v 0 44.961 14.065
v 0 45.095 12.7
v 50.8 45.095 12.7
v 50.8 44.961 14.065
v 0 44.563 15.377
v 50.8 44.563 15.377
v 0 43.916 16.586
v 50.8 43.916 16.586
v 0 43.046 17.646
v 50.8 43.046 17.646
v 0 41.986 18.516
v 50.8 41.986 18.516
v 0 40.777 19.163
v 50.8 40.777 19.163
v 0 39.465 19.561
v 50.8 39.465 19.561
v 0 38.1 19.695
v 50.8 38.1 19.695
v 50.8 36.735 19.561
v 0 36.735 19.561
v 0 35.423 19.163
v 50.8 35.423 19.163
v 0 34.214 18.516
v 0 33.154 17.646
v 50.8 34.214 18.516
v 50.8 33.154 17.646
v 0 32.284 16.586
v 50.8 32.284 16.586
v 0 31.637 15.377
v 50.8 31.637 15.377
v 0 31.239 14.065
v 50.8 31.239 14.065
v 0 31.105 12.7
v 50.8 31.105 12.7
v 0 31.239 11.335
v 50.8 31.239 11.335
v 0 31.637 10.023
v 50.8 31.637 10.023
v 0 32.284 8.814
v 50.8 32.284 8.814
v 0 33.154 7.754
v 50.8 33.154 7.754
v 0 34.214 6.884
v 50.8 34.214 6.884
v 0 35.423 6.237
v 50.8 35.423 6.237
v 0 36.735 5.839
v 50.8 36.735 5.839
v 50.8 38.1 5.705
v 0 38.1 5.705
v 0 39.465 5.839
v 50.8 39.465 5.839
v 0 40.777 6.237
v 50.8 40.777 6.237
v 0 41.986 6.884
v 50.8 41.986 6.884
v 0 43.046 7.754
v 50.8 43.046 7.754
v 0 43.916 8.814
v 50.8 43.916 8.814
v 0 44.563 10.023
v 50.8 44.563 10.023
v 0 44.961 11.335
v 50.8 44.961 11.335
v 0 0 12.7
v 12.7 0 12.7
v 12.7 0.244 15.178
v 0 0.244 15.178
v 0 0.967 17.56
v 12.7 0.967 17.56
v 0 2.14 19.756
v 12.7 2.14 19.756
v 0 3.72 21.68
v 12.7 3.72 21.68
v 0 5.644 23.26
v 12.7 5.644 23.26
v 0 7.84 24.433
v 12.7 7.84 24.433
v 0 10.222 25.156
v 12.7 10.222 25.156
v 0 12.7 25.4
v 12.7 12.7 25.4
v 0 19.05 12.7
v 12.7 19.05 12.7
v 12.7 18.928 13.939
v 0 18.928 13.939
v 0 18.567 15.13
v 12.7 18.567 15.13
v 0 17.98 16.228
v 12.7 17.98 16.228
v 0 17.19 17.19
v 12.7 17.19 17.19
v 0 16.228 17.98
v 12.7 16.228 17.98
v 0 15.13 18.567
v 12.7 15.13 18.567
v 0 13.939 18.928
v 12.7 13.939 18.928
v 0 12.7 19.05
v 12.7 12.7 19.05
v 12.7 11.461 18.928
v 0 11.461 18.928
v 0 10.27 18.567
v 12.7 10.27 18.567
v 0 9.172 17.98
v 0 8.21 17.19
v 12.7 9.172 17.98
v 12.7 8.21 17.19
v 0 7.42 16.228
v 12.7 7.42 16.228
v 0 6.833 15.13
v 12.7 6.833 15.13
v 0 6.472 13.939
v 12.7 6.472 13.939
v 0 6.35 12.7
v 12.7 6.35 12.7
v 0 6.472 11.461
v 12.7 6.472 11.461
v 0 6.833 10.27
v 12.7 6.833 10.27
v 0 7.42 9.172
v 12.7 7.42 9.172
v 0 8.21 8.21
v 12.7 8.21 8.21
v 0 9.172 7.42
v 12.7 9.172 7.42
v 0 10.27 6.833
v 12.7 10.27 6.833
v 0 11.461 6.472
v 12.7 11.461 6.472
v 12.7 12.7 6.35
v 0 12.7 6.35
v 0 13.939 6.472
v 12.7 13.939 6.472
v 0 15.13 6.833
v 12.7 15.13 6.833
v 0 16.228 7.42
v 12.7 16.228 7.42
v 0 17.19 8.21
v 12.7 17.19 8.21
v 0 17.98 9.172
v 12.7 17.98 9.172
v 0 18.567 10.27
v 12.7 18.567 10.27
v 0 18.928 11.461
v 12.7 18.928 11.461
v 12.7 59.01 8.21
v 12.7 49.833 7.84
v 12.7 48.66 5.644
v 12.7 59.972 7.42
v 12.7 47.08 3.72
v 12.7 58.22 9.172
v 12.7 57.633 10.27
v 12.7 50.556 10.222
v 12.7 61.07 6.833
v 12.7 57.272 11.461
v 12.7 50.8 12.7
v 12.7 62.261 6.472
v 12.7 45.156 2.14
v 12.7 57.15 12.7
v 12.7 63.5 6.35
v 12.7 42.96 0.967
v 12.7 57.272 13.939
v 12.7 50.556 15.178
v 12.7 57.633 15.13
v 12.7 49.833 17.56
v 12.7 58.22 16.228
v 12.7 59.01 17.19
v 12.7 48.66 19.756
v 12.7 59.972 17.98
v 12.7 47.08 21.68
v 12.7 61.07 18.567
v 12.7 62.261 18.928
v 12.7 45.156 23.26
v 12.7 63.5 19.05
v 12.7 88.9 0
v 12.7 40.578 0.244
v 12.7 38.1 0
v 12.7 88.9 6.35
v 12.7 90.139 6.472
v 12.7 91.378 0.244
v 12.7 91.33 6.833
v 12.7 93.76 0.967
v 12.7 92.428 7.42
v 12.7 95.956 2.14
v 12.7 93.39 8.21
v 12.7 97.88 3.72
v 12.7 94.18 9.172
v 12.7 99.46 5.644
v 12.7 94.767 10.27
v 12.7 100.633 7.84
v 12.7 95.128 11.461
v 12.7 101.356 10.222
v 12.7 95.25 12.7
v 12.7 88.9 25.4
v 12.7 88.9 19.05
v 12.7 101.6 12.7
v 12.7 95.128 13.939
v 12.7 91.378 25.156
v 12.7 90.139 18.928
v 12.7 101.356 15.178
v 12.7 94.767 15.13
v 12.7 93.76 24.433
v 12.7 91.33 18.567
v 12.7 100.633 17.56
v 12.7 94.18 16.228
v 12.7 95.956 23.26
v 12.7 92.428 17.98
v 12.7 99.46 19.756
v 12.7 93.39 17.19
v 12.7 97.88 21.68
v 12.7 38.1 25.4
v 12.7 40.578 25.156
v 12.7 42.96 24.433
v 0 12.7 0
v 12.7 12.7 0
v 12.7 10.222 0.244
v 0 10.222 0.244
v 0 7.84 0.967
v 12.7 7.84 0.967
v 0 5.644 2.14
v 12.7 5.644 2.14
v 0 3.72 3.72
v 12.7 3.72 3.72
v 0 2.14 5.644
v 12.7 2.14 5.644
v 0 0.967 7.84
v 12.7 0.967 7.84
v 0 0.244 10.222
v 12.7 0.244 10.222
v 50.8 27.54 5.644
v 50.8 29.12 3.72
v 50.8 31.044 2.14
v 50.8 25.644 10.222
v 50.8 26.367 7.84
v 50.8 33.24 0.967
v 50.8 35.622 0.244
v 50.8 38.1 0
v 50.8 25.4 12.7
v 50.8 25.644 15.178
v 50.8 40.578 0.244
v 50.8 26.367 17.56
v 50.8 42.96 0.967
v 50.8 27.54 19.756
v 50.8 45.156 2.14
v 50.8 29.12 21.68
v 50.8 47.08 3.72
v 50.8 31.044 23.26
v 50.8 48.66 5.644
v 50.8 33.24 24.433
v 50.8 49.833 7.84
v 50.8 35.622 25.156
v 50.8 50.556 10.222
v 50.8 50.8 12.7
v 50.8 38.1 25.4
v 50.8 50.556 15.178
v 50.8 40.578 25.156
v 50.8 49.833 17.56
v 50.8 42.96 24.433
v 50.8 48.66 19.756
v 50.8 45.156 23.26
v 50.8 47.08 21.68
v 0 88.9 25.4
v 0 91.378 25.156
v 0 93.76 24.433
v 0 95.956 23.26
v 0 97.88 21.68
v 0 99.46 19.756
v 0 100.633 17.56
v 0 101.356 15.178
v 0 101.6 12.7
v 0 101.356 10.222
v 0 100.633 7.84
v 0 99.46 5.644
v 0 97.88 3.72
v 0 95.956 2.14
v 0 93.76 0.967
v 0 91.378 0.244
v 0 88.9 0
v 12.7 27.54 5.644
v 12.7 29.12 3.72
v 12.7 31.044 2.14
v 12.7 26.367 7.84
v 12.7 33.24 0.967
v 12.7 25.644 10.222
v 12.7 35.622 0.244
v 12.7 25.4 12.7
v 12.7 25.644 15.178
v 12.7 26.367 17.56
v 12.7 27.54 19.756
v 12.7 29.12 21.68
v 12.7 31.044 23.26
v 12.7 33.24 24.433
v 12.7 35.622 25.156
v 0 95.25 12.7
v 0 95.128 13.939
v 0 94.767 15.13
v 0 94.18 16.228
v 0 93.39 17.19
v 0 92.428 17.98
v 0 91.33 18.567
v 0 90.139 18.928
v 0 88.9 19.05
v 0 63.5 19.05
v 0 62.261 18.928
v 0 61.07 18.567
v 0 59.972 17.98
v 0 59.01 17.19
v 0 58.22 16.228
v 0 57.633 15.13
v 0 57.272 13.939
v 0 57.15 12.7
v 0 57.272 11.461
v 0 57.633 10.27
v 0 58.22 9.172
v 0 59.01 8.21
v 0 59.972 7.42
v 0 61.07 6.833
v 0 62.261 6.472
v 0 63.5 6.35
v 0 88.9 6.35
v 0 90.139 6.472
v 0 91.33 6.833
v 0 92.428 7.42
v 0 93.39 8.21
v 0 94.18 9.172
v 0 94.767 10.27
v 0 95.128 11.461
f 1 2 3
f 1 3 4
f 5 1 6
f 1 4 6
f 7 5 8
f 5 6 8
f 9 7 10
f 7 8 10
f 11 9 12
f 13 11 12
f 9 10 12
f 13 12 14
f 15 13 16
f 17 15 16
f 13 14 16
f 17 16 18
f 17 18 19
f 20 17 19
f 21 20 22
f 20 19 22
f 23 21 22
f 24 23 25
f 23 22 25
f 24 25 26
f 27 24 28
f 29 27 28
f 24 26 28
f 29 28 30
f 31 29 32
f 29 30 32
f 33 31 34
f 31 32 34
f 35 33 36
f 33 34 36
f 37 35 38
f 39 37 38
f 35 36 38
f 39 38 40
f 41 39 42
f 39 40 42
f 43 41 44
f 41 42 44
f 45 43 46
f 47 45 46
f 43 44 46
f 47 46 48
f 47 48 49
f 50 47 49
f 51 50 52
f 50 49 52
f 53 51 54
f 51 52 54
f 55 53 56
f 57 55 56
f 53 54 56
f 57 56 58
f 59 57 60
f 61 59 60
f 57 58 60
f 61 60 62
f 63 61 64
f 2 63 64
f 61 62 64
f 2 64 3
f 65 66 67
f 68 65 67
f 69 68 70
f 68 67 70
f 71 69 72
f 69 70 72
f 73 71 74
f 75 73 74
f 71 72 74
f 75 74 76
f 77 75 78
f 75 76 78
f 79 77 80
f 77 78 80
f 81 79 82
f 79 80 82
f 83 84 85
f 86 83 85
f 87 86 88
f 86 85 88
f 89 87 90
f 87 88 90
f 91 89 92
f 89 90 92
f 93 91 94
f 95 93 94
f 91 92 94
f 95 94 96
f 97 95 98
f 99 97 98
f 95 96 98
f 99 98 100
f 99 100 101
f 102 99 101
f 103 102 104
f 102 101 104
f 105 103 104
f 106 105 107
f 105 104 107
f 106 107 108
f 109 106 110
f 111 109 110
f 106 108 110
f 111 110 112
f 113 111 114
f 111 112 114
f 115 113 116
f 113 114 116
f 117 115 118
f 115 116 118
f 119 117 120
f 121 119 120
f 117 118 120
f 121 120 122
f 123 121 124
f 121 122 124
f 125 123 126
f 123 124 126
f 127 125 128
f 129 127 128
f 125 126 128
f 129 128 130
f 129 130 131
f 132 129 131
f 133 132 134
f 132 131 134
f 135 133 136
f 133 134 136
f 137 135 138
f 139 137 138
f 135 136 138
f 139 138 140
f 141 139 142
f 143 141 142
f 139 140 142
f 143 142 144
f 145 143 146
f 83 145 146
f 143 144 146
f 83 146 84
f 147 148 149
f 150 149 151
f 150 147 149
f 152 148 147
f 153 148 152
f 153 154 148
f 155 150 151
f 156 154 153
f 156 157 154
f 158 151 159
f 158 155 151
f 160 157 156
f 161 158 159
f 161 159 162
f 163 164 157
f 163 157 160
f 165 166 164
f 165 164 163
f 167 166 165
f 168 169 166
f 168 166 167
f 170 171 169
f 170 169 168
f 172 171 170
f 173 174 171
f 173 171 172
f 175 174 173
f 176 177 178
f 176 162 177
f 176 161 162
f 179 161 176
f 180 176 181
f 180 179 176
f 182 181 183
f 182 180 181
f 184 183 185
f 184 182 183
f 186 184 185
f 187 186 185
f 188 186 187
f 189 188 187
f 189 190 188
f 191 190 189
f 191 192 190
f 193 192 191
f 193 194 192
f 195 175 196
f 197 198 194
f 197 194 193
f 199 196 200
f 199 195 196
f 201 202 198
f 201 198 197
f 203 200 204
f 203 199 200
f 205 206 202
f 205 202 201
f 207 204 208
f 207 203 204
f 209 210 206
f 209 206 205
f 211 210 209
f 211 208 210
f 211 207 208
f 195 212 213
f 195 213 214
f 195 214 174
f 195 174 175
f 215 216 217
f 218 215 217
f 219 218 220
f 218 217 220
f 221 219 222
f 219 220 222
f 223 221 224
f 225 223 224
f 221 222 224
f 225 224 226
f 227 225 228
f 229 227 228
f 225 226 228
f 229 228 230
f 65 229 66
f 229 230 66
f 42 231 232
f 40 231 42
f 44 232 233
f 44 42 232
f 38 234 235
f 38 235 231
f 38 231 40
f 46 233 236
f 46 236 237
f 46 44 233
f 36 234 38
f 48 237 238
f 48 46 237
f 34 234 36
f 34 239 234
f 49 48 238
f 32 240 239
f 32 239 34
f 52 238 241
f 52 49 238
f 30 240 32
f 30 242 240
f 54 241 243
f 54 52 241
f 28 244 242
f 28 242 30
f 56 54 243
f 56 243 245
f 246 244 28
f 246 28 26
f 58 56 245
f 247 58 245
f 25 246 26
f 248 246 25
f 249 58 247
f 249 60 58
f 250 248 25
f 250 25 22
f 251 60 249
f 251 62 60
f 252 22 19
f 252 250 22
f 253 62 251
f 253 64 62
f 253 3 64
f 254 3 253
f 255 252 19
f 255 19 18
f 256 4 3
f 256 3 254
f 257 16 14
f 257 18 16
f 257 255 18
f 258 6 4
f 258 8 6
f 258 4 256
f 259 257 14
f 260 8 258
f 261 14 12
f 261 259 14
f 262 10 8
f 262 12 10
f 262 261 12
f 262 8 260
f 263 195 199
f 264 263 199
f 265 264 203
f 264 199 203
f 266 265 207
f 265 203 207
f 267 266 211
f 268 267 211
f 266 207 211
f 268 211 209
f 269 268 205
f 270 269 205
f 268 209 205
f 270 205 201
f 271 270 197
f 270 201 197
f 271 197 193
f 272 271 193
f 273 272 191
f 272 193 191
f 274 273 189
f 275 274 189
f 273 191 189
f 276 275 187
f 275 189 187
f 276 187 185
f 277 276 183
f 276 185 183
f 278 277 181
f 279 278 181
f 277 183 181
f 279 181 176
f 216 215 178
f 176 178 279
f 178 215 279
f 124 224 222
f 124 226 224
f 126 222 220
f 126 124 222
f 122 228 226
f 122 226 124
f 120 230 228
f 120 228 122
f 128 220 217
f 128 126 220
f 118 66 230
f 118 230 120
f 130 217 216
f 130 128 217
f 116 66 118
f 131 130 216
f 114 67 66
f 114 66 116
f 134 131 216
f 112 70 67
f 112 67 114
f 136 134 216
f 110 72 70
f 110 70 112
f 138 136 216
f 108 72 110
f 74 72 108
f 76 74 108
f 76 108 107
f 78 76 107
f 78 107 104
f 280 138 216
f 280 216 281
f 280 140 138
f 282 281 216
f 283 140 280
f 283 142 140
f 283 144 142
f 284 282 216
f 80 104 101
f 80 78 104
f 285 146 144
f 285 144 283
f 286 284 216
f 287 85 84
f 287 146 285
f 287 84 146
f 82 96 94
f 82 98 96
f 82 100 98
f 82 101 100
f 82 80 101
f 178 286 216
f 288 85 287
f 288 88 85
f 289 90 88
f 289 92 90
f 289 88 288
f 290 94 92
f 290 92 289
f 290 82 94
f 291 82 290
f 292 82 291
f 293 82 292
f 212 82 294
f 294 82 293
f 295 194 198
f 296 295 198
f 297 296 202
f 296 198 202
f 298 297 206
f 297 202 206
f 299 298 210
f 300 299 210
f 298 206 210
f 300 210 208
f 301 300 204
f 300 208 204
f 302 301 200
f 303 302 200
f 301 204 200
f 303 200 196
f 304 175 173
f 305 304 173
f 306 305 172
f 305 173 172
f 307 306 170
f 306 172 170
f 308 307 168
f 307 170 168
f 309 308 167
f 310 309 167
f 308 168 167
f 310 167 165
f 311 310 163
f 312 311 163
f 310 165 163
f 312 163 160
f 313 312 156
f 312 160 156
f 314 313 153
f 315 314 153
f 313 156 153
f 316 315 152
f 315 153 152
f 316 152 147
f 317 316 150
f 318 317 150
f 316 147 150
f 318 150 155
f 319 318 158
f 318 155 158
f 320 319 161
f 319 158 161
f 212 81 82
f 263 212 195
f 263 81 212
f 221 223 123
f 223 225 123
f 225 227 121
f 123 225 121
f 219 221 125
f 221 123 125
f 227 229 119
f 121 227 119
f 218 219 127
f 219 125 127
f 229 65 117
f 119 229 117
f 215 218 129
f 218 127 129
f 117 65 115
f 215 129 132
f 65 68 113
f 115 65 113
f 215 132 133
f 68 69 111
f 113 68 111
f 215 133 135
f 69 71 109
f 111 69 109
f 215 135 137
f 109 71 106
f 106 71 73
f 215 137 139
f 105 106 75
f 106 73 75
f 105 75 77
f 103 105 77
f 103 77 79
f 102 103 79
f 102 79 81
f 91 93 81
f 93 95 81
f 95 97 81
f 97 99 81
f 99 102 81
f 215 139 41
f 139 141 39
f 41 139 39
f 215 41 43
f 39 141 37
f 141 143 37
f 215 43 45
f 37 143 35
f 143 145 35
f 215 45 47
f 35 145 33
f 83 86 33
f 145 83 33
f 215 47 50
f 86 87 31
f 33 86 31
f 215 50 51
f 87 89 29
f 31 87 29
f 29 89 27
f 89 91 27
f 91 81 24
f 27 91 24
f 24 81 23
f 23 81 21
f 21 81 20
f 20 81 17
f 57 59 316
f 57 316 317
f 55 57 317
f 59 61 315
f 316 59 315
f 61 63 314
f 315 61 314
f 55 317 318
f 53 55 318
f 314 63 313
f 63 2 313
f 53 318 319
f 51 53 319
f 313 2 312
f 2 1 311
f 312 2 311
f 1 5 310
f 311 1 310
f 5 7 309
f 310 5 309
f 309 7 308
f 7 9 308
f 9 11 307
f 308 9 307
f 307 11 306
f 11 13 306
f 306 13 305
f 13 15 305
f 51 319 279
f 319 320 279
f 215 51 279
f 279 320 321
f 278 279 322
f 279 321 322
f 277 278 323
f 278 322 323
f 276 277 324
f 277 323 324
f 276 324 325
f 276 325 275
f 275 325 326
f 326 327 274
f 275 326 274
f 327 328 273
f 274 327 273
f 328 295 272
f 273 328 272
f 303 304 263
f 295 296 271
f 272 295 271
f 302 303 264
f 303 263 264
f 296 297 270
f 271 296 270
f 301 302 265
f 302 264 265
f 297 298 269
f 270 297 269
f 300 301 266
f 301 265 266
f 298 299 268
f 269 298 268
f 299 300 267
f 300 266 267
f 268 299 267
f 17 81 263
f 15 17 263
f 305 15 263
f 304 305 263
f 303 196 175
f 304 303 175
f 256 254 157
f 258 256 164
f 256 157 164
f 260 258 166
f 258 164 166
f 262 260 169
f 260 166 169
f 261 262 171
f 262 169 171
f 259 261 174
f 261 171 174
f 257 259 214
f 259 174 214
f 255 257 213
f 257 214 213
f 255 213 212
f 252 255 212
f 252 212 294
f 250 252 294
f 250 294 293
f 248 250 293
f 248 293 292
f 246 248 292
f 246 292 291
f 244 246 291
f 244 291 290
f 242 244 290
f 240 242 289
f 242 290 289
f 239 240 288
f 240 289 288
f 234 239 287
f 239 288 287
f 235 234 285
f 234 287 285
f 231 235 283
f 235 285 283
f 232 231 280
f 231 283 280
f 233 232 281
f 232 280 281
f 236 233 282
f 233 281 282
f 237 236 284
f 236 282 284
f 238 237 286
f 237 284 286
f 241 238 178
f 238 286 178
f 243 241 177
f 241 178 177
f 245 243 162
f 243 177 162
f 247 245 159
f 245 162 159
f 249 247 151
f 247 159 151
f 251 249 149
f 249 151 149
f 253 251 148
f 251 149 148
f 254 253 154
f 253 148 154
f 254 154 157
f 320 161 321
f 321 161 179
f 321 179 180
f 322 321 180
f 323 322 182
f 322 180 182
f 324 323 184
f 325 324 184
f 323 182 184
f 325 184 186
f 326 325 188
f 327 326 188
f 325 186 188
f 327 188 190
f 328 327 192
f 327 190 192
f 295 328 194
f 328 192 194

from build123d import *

# Parameters (mm, degrees)
F0_W      = 101.6
F0_H      = 25.4
F1_DEPTH  = 12.7
F3_DEPTH  = 12.7
F4_R      = 6.35
F5_DEPTH  = 12.7
F7_R      = 12.7
F8_DEPTH  = 38.1
F9_R      = 6.9951982556
F10_DEPTH = 50.8


# Not quite as in the source:
# - ends of sketch curves that miss each other by under 0.0002 mm in the source are joined


with BuildPart() as f1:
    # F0 (on Right) → F1 (new body)
    with BuildSketch(Plane.YZ):
        with Locations((50.8, 12.7)):
            Rectangle(F0_W, F0_H)
    extrude(amount=F1_DEPTH)

    # F2 (on face) → F3 (cut)
    with BuildSketch(Plane.YZ.offset(12.7)):
        with BuildLine():
            Line((0, 25.4), (0, 12.7))
            ThreePointArc((0, 12.7), (3.7197438789, 21.6802561211), (12.7, 25.4))
            Line((12.7, 25.4), (0, 25.4))
        make_face()
        with BuildLine():
            Line((0, 0), (12.7, 0))
            ThreePointArc((12.7, 0), (3.7197438789, 3.7197438789), (0, 12.7))
            Line((0, 12.7), (0, 0))
        make_face()
        with BuildLine():
            ThreePointArc((88.9, 25.4), (97.8802564546, 21.6802563035), (101.6000005159, 12.7))
            Line((101.6000005159, 12.7), (101.6, 25.4))
            Line((101.6, 25.4), (88.9, 25.4))
        make_face()
        with BuildLine():
            ThreePointArc((101.6000005159, 12.7), (97.8802568194, 3.7197440613), (88.9000010318, 0))
            Line((88.9000010318, 0), (101.6, 0))
            Line((101.6, 0), (101.6000005159, 12.7))
        make_face()
    extrude(amount=-F3_DEPTH, mode=Mode.SUBTRACT)

    # F4 (on face) → F5 (cut)
    with BuildSketch(Plane.YZ.offset(12.7)):
        with Locations((12.7, 12.7)):
            Circle(F4_R)
        with BuildLine():
            ThreePointArc((63.5000005159, 6.35), (67.9901285764, 8.2098719395), (69.8500005159, 12.7))
            ThreePointArc((69.8500005159, 12.7), (67.9901285764, 17.1901280605), (63.5000005159, 19.05))
            ThreePointArc((63.5000005159, 19.05), (57.1500005159, 12.7), (63.5000005159, 6.35))
        make_face()
        with BuildLine():
            ThreePointArc((63.5000005159, 19.05), (67.9901285764, 17.1901280605), (69.8500005159, 12.7))
            ThreePointArc((69.8500005159, 12.7), (67.9901285764, 8.2098719395), (63.5000005159, 6.35))
            Line((63.5000005159, 6.35), (88.9000005159, 6.35))
            ThreePointArc((88.9000005159, 6.35), (82.5500005159, 12.7), (88.9000005159, 19.05))
            Line((88.9000005159, 19.05), (63.5000005159, 19.05))
        make_face()
        with BuildLine():
            ThreePointArc((95.2500005159, 12.7), (93.3901285764, 17.1901280605), (88.9000005159, 19.05))
            ThreePointArc((88.9000005159, 19.05), (82.5500005159, 12.7), (88.9000005159, 6.35))
            ThreePointArc((88.9000005159, 6.35), (93.3901285764, 8.2098719395), (95.2500005159, 12.7))
        make_face()
    extrude(amount=-F5_DEPTH, mode=Mode.SUBTRACT)

    # F7 (on face) → F8 (join)
    with BuildSketch(Plane.YZ.offset(12.7)):
        with Locations((38.1, 12.7)):
            Circle(F7_R)
    extrude(amount=F8_DEPTH)

    # F9 (on face) → F10 (cut)
    with BuildSketch(Plane.YZ.offset(50.8)):
        with Locations((38.1, 12.7)):
            Circle(F9_R)
    extrude(amount=-F10_DEPTH, mode=Mode.SUBTRACT)


solid = f1.part
